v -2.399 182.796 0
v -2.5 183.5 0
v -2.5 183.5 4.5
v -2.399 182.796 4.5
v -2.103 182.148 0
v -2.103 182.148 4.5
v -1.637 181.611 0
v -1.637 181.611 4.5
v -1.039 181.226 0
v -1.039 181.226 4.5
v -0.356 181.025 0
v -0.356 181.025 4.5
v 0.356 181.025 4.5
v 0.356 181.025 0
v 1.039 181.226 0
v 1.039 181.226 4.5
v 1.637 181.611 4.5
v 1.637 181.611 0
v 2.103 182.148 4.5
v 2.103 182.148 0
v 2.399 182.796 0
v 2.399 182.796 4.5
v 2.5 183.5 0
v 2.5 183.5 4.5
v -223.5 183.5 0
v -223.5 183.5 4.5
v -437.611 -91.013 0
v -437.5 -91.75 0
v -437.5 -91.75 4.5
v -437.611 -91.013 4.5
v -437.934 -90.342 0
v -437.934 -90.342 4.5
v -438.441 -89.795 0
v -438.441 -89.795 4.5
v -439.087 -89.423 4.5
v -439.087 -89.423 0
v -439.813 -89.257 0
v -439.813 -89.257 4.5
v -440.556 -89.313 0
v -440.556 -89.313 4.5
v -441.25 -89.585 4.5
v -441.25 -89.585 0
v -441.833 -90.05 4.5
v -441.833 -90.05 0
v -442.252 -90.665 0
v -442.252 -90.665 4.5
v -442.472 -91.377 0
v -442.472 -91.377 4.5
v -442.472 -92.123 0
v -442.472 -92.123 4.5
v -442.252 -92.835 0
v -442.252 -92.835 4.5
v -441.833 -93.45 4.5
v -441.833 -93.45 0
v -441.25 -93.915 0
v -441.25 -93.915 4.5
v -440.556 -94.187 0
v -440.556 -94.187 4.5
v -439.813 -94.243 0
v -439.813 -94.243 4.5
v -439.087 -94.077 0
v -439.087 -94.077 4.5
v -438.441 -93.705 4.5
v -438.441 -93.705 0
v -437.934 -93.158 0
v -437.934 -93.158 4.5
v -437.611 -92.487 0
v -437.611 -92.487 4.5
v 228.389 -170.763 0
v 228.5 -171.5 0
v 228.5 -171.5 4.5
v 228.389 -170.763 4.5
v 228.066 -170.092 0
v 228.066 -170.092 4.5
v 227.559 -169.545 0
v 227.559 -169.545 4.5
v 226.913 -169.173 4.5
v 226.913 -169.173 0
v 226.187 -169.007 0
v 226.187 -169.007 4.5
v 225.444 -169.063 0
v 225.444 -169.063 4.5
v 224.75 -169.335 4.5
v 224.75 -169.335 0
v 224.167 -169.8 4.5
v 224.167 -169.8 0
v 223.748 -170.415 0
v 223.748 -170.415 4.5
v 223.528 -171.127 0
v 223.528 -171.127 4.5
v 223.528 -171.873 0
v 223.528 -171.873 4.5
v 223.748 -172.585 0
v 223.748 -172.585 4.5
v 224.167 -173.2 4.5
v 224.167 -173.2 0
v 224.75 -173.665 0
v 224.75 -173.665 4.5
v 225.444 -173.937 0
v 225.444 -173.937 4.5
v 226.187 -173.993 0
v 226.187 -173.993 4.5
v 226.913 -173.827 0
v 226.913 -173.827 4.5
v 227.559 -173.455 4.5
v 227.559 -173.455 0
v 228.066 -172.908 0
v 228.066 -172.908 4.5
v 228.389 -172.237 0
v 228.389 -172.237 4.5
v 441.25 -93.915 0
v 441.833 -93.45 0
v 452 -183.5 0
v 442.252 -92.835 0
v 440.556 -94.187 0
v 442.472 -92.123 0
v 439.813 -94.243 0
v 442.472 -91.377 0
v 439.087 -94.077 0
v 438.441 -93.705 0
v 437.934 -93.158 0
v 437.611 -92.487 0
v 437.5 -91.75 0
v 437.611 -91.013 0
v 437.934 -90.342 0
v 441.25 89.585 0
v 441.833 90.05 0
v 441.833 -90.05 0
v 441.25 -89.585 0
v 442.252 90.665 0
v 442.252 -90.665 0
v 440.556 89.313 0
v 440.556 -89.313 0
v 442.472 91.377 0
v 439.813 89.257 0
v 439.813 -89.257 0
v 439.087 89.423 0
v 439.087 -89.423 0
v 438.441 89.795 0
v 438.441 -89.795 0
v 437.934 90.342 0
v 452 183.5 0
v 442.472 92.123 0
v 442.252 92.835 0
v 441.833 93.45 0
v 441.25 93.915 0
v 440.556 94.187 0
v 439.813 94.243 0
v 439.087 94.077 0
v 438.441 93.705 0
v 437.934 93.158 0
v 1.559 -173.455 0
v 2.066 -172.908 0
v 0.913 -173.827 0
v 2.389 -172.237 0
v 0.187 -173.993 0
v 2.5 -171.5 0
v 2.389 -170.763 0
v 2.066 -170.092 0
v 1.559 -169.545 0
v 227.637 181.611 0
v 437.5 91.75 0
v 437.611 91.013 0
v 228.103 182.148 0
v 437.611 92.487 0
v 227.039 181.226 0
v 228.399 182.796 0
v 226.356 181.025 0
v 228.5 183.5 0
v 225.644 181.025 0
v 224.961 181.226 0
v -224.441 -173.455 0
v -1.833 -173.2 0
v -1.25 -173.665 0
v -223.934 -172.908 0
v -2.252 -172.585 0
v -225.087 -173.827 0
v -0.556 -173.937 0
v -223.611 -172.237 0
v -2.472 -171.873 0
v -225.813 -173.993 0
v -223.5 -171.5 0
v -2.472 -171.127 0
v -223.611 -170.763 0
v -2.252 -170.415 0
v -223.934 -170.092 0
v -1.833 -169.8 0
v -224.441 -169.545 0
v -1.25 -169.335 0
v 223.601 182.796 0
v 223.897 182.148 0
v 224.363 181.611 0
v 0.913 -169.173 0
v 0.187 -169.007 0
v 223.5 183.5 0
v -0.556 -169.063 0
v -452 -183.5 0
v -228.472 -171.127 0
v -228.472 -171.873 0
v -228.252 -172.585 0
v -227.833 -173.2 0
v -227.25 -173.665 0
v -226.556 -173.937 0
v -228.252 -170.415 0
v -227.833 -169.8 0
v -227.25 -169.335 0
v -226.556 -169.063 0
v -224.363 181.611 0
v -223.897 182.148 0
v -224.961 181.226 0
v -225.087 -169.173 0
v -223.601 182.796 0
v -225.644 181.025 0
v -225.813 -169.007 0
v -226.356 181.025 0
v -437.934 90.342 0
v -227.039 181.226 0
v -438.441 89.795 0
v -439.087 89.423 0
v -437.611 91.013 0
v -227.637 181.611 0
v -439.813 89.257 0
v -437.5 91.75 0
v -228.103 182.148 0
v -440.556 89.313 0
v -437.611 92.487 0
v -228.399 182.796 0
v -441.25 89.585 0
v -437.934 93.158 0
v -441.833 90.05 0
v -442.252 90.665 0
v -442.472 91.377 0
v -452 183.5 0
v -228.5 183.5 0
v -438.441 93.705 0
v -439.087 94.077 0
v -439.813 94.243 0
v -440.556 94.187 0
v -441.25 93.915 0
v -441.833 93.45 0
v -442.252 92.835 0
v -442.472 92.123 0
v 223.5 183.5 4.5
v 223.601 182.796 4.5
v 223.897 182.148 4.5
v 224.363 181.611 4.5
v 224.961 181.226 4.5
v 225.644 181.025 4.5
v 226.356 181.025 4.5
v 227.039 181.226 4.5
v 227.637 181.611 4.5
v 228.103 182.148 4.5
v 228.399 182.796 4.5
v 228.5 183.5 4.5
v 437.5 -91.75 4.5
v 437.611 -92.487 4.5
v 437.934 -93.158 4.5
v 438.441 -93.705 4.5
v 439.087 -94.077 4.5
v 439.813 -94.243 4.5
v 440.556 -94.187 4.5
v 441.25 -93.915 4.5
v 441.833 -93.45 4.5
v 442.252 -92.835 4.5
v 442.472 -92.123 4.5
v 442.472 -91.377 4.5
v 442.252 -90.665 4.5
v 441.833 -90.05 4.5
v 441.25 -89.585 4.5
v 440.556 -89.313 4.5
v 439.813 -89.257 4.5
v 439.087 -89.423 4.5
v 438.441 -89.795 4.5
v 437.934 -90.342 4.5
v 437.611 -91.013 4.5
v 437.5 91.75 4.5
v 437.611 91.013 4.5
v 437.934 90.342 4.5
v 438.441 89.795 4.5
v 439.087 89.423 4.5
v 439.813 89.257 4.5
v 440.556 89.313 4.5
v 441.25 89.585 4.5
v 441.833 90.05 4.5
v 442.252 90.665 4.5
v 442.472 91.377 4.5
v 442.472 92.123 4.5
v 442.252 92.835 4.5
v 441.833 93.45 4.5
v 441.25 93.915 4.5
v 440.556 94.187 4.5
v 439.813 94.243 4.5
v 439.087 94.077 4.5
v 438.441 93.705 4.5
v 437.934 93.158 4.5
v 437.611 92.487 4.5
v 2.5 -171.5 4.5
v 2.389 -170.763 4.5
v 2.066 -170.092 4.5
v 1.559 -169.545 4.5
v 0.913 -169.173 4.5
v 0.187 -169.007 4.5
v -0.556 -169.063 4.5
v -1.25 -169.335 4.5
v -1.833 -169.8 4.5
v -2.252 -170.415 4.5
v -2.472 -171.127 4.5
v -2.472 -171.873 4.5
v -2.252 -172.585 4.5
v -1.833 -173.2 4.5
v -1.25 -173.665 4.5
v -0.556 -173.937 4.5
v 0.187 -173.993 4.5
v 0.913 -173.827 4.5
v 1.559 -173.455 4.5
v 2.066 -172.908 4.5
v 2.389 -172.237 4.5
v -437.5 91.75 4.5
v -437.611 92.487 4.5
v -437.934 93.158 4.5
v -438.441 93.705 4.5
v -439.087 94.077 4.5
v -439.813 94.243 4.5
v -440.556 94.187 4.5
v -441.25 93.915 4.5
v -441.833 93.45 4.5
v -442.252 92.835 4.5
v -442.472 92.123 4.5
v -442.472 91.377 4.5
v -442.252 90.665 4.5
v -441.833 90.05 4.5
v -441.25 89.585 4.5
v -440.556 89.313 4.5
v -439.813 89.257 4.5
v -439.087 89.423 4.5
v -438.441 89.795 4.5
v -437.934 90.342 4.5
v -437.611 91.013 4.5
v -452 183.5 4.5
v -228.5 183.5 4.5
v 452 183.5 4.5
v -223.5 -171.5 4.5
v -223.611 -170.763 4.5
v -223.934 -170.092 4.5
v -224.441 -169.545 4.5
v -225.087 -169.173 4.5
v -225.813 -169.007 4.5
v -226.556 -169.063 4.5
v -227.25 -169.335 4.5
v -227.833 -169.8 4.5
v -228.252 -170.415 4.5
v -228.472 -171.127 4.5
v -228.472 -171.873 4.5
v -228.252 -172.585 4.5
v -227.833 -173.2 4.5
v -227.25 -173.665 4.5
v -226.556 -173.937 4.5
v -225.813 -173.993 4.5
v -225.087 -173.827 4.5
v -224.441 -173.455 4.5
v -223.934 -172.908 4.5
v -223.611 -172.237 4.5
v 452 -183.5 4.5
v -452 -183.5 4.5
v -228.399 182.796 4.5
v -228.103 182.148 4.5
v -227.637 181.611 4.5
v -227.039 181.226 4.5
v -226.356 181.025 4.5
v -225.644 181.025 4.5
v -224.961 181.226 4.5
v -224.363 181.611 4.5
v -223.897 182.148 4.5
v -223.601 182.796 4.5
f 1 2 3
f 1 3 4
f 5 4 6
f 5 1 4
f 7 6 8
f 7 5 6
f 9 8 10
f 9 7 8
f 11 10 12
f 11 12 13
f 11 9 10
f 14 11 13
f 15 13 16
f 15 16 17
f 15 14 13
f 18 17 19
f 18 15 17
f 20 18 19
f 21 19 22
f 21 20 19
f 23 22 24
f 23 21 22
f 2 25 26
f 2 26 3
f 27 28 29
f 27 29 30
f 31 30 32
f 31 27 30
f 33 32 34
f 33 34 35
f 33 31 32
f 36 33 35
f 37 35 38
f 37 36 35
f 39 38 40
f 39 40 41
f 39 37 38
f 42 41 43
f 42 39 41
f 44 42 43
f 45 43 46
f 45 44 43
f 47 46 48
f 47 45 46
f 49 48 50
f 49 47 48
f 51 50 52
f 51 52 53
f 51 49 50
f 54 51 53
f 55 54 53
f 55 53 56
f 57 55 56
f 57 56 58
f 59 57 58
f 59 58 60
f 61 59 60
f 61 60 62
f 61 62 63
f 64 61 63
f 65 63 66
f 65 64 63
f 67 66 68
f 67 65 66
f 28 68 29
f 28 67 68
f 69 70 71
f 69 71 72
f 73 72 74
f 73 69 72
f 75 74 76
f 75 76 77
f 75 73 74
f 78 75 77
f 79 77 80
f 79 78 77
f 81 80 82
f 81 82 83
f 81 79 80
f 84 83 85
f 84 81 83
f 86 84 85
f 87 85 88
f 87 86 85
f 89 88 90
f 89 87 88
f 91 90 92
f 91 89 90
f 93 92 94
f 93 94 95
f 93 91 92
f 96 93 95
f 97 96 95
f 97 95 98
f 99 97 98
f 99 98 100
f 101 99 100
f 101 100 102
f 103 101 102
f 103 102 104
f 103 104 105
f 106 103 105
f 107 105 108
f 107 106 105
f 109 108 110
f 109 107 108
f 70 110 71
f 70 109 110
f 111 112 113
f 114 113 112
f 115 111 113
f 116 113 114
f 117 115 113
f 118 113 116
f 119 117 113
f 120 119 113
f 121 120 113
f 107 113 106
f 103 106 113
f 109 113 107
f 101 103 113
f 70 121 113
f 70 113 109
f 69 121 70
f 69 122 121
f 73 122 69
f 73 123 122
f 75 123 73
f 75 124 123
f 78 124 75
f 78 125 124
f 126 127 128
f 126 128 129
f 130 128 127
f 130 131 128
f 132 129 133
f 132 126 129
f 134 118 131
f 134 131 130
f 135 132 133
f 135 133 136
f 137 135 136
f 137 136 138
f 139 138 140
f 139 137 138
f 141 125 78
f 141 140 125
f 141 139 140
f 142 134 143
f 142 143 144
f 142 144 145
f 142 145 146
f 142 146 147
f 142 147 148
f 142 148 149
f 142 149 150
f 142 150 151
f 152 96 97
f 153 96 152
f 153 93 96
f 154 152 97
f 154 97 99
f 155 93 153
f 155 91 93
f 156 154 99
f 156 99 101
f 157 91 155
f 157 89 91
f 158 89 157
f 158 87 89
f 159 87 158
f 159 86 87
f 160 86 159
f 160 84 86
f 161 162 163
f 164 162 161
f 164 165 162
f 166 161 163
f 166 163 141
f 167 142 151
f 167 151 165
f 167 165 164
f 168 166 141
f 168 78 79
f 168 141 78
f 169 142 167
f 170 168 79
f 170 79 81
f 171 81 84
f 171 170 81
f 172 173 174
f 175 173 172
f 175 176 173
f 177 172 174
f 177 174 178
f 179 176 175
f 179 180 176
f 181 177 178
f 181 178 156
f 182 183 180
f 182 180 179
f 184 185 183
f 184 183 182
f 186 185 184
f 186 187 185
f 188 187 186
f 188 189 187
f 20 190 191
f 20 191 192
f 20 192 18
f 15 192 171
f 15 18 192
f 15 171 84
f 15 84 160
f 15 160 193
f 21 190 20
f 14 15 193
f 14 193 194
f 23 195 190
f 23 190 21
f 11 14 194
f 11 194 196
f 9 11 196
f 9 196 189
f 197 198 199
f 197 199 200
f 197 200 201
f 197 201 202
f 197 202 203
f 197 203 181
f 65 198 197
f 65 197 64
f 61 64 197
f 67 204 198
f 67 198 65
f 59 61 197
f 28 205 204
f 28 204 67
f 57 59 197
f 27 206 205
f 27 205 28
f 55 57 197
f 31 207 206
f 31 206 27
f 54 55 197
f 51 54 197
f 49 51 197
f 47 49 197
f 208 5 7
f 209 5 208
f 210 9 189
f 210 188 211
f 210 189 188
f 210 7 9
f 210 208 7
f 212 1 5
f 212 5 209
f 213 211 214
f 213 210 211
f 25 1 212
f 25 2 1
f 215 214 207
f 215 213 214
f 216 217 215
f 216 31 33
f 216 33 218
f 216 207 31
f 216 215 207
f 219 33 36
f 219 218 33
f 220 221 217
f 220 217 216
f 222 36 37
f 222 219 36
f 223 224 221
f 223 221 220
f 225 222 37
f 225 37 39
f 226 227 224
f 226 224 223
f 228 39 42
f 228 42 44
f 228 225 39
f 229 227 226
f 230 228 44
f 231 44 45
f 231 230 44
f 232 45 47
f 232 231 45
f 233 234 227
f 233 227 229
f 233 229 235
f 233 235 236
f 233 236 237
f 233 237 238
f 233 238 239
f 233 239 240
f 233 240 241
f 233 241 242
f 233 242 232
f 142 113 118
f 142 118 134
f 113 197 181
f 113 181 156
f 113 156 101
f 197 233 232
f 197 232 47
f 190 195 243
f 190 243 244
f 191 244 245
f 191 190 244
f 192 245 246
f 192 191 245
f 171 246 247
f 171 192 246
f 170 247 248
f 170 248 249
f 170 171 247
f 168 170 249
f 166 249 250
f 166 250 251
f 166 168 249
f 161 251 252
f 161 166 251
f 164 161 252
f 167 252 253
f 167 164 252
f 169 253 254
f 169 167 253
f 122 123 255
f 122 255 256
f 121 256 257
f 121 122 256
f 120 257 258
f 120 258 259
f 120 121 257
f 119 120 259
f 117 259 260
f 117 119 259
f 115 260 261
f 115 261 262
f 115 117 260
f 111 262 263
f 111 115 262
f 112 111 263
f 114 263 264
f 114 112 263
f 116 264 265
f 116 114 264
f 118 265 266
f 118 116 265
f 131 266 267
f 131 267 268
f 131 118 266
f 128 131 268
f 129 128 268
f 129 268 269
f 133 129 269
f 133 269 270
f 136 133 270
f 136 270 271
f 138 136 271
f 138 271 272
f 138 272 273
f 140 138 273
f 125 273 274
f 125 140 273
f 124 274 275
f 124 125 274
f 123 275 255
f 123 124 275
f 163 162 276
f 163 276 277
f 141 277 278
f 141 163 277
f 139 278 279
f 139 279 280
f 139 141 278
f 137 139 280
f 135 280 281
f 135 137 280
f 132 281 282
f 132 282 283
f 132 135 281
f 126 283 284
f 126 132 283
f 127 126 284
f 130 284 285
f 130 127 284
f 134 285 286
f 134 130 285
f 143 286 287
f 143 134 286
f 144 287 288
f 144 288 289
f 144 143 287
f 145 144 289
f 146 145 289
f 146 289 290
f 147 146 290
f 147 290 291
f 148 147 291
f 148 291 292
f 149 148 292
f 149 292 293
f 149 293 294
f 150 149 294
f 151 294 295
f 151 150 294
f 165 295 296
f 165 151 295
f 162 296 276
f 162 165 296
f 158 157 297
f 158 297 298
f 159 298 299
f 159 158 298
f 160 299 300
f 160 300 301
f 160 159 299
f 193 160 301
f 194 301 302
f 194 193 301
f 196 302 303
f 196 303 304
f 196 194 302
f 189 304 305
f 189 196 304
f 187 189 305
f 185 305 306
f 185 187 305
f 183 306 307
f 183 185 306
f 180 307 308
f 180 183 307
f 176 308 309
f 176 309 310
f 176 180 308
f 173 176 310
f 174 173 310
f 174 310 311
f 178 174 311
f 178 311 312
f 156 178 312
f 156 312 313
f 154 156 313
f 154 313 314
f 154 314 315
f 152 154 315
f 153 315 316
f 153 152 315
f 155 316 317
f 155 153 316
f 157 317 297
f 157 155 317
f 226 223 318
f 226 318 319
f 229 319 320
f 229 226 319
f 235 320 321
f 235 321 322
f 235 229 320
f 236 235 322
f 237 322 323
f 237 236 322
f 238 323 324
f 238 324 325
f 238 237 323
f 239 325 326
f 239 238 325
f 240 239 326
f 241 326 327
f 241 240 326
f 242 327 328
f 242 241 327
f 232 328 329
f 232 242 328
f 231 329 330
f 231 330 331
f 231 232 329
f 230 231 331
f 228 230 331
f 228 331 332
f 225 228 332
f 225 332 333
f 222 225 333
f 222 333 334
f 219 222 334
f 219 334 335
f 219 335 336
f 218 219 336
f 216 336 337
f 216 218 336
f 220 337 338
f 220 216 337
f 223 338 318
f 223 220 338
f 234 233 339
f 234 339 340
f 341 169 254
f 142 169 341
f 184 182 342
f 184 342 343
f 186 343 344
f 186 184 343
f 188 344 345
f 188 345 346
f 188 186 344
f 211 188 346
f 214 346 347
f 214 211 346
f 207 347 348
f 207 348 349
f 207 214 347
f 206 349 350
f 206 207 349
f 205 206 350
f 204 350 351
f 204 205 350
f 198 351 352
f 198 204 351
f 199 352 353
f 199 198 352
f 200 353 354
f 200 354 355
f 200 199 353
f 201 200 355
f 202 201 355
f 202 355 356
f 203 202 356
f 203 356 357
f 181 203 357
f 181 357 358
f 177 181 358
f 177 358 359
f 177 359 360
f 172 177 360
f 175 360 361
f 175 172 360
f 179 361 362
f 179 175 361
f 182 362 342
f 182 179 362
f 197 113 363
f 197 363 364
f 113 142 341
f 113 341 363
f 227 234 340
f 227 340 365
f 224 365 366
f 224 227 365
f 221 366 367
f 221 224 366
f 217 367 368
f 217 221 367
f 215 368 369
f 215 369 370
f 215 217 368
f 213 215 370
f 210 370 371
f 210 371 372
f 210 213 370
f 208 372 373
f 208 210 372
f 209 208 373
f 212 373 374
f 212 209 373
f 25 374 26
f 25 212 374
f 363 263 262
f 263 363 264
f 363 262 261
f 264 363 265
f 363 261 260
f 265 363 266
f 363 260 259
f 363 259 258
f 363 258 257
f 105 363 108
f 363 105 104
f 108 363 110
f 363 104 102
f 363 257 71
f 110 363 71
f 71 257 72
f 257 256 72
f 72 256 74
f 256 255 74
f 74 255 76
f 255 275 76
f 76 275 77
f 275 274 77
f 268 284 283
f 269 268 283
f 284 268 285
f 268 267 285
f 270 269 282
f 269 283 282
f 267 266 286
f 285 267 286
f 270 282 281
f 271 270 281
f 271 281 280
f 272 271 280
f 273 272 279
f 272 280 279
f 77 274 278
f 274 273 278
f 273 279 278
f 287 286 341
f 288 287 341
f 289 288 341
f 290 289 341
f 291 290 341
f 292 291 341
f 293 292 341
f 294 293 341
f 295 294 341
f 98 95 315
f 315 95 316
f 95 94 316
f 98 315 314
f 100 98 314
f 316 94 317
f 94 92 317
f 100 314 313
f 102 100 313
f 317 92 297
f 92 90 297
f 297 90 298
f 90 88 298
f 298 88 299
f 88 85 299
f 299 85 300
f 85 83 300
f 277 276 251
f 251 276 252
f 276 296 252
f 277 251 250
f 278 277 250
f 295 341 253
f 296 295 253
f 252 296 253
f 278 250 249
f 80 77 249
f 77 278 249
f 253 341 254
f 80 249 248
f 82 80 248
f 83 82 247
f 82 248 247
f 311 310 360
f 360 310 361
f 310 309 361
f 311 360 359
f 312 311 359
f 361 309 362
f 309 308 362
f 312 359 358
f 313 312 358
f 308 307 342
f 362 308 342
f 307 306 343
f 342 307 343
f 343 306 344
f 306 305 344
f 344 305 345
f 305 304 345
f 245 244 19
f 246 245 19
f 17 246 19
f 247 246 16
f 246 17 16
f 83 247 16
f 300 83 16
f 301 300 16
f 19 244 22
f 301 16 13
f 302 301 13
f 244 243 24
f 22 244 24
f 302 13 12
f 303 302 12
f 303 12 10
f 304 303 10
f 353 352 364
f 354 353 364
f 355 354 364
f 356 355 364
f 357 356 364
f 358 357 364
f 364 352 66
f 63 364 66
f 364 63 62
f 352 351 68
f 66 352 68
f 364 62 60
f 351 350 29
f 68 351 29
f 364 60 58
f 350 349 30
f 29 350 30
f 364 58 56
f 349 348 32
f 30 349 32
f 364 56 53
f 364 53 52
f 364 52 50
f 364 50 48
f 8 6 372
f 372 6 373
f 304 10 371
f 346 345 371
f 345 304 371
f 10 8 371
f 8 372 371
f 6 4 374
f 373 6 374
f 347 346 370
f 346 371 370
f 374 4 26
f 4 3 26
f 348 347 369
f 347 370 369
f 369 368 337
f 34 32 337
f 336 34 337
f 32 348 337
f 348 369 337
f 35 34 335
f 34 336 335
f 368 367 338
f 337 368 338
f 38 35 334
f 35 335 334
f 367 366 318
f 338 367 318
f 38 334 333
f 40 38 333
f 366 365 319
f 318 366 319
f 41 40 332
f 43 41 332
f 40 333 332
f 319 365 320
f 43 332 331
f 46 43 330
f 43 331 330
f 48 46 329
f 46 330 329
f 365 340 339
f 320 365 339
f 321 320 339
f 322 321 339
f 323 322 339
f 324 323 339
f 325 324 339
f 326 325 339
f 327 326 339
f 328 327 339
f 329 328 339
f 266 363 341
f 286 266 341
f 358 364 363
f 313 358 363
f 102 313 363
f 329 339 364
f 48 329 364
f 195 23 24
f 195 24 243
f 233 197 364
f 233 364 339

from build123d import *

# Parameters (mm, degrees)
SKETCH2_R           = 2.5
BOSS_EXTRUDE1_DEPTH = 4.5


with BuildPart() as part:
    # Sketch2 → Boss-Extrude1 (new body)
    with BuildSketch(Plane.XY):
        with BuildLine():
            Line((2.5, 183.5), (223.5, 183.5))
            ThreePointArc((223.5, 183.5), (226, 181), (228.5, 183.5))
            Line((228.5, 183.5), (452, 183.5))
            Line((452, 183.5), (452, -183.5))
            Line((452, -183.5), (-452, -183.5))
            Line((-452, -183.5), (-452, 183.5))
            Line((-452, 183.5), (-228.5, 183.5))
            ThreePointArc((-228.5, 183.5), (-226, 181), (-223.5, 183.5))
            Line((-223.5, 183.5), (-2.5, 183.5))
            ThreePointArc((-2.5, 183.5), (0, 181), (2.5, 183.5))
        make_face()
        with Locations((0, -171.5)):
            Circle(SKETCH2_R, mode=Mode.SUBTRACT)
        with Locations((226, -171.5)):
            Circle(SKETCH2_R, mode=Mode.SUBTRACT)
        with Locations((-226, -171.5)):
            Circle(SKETCH2_R, mode=Mode.SUBTRACT)
        with Locations((-440, 91.75)):
            Circle(SKETCH2_R, mode=Mode.SUBTRACT)
        with Locations((-440, -91.75)):
            Circle(SKETCH2_R, mode=Mode.SUBTRACT)
        with Locations(Location((440, -91.75, 0), (0, 0, 180))):
            Circle(SKETCH2_R, mode=Mode.SUBTRACT)
        with Locations(Location((440, 91.75, 0), (0, 0, 180))):
            Circle(SKETCH2_R, mode=Mode.SUBTRACT)
    extrude(amount=BOSS_EXTRUDE1_DEPTH)


solid = part.part
